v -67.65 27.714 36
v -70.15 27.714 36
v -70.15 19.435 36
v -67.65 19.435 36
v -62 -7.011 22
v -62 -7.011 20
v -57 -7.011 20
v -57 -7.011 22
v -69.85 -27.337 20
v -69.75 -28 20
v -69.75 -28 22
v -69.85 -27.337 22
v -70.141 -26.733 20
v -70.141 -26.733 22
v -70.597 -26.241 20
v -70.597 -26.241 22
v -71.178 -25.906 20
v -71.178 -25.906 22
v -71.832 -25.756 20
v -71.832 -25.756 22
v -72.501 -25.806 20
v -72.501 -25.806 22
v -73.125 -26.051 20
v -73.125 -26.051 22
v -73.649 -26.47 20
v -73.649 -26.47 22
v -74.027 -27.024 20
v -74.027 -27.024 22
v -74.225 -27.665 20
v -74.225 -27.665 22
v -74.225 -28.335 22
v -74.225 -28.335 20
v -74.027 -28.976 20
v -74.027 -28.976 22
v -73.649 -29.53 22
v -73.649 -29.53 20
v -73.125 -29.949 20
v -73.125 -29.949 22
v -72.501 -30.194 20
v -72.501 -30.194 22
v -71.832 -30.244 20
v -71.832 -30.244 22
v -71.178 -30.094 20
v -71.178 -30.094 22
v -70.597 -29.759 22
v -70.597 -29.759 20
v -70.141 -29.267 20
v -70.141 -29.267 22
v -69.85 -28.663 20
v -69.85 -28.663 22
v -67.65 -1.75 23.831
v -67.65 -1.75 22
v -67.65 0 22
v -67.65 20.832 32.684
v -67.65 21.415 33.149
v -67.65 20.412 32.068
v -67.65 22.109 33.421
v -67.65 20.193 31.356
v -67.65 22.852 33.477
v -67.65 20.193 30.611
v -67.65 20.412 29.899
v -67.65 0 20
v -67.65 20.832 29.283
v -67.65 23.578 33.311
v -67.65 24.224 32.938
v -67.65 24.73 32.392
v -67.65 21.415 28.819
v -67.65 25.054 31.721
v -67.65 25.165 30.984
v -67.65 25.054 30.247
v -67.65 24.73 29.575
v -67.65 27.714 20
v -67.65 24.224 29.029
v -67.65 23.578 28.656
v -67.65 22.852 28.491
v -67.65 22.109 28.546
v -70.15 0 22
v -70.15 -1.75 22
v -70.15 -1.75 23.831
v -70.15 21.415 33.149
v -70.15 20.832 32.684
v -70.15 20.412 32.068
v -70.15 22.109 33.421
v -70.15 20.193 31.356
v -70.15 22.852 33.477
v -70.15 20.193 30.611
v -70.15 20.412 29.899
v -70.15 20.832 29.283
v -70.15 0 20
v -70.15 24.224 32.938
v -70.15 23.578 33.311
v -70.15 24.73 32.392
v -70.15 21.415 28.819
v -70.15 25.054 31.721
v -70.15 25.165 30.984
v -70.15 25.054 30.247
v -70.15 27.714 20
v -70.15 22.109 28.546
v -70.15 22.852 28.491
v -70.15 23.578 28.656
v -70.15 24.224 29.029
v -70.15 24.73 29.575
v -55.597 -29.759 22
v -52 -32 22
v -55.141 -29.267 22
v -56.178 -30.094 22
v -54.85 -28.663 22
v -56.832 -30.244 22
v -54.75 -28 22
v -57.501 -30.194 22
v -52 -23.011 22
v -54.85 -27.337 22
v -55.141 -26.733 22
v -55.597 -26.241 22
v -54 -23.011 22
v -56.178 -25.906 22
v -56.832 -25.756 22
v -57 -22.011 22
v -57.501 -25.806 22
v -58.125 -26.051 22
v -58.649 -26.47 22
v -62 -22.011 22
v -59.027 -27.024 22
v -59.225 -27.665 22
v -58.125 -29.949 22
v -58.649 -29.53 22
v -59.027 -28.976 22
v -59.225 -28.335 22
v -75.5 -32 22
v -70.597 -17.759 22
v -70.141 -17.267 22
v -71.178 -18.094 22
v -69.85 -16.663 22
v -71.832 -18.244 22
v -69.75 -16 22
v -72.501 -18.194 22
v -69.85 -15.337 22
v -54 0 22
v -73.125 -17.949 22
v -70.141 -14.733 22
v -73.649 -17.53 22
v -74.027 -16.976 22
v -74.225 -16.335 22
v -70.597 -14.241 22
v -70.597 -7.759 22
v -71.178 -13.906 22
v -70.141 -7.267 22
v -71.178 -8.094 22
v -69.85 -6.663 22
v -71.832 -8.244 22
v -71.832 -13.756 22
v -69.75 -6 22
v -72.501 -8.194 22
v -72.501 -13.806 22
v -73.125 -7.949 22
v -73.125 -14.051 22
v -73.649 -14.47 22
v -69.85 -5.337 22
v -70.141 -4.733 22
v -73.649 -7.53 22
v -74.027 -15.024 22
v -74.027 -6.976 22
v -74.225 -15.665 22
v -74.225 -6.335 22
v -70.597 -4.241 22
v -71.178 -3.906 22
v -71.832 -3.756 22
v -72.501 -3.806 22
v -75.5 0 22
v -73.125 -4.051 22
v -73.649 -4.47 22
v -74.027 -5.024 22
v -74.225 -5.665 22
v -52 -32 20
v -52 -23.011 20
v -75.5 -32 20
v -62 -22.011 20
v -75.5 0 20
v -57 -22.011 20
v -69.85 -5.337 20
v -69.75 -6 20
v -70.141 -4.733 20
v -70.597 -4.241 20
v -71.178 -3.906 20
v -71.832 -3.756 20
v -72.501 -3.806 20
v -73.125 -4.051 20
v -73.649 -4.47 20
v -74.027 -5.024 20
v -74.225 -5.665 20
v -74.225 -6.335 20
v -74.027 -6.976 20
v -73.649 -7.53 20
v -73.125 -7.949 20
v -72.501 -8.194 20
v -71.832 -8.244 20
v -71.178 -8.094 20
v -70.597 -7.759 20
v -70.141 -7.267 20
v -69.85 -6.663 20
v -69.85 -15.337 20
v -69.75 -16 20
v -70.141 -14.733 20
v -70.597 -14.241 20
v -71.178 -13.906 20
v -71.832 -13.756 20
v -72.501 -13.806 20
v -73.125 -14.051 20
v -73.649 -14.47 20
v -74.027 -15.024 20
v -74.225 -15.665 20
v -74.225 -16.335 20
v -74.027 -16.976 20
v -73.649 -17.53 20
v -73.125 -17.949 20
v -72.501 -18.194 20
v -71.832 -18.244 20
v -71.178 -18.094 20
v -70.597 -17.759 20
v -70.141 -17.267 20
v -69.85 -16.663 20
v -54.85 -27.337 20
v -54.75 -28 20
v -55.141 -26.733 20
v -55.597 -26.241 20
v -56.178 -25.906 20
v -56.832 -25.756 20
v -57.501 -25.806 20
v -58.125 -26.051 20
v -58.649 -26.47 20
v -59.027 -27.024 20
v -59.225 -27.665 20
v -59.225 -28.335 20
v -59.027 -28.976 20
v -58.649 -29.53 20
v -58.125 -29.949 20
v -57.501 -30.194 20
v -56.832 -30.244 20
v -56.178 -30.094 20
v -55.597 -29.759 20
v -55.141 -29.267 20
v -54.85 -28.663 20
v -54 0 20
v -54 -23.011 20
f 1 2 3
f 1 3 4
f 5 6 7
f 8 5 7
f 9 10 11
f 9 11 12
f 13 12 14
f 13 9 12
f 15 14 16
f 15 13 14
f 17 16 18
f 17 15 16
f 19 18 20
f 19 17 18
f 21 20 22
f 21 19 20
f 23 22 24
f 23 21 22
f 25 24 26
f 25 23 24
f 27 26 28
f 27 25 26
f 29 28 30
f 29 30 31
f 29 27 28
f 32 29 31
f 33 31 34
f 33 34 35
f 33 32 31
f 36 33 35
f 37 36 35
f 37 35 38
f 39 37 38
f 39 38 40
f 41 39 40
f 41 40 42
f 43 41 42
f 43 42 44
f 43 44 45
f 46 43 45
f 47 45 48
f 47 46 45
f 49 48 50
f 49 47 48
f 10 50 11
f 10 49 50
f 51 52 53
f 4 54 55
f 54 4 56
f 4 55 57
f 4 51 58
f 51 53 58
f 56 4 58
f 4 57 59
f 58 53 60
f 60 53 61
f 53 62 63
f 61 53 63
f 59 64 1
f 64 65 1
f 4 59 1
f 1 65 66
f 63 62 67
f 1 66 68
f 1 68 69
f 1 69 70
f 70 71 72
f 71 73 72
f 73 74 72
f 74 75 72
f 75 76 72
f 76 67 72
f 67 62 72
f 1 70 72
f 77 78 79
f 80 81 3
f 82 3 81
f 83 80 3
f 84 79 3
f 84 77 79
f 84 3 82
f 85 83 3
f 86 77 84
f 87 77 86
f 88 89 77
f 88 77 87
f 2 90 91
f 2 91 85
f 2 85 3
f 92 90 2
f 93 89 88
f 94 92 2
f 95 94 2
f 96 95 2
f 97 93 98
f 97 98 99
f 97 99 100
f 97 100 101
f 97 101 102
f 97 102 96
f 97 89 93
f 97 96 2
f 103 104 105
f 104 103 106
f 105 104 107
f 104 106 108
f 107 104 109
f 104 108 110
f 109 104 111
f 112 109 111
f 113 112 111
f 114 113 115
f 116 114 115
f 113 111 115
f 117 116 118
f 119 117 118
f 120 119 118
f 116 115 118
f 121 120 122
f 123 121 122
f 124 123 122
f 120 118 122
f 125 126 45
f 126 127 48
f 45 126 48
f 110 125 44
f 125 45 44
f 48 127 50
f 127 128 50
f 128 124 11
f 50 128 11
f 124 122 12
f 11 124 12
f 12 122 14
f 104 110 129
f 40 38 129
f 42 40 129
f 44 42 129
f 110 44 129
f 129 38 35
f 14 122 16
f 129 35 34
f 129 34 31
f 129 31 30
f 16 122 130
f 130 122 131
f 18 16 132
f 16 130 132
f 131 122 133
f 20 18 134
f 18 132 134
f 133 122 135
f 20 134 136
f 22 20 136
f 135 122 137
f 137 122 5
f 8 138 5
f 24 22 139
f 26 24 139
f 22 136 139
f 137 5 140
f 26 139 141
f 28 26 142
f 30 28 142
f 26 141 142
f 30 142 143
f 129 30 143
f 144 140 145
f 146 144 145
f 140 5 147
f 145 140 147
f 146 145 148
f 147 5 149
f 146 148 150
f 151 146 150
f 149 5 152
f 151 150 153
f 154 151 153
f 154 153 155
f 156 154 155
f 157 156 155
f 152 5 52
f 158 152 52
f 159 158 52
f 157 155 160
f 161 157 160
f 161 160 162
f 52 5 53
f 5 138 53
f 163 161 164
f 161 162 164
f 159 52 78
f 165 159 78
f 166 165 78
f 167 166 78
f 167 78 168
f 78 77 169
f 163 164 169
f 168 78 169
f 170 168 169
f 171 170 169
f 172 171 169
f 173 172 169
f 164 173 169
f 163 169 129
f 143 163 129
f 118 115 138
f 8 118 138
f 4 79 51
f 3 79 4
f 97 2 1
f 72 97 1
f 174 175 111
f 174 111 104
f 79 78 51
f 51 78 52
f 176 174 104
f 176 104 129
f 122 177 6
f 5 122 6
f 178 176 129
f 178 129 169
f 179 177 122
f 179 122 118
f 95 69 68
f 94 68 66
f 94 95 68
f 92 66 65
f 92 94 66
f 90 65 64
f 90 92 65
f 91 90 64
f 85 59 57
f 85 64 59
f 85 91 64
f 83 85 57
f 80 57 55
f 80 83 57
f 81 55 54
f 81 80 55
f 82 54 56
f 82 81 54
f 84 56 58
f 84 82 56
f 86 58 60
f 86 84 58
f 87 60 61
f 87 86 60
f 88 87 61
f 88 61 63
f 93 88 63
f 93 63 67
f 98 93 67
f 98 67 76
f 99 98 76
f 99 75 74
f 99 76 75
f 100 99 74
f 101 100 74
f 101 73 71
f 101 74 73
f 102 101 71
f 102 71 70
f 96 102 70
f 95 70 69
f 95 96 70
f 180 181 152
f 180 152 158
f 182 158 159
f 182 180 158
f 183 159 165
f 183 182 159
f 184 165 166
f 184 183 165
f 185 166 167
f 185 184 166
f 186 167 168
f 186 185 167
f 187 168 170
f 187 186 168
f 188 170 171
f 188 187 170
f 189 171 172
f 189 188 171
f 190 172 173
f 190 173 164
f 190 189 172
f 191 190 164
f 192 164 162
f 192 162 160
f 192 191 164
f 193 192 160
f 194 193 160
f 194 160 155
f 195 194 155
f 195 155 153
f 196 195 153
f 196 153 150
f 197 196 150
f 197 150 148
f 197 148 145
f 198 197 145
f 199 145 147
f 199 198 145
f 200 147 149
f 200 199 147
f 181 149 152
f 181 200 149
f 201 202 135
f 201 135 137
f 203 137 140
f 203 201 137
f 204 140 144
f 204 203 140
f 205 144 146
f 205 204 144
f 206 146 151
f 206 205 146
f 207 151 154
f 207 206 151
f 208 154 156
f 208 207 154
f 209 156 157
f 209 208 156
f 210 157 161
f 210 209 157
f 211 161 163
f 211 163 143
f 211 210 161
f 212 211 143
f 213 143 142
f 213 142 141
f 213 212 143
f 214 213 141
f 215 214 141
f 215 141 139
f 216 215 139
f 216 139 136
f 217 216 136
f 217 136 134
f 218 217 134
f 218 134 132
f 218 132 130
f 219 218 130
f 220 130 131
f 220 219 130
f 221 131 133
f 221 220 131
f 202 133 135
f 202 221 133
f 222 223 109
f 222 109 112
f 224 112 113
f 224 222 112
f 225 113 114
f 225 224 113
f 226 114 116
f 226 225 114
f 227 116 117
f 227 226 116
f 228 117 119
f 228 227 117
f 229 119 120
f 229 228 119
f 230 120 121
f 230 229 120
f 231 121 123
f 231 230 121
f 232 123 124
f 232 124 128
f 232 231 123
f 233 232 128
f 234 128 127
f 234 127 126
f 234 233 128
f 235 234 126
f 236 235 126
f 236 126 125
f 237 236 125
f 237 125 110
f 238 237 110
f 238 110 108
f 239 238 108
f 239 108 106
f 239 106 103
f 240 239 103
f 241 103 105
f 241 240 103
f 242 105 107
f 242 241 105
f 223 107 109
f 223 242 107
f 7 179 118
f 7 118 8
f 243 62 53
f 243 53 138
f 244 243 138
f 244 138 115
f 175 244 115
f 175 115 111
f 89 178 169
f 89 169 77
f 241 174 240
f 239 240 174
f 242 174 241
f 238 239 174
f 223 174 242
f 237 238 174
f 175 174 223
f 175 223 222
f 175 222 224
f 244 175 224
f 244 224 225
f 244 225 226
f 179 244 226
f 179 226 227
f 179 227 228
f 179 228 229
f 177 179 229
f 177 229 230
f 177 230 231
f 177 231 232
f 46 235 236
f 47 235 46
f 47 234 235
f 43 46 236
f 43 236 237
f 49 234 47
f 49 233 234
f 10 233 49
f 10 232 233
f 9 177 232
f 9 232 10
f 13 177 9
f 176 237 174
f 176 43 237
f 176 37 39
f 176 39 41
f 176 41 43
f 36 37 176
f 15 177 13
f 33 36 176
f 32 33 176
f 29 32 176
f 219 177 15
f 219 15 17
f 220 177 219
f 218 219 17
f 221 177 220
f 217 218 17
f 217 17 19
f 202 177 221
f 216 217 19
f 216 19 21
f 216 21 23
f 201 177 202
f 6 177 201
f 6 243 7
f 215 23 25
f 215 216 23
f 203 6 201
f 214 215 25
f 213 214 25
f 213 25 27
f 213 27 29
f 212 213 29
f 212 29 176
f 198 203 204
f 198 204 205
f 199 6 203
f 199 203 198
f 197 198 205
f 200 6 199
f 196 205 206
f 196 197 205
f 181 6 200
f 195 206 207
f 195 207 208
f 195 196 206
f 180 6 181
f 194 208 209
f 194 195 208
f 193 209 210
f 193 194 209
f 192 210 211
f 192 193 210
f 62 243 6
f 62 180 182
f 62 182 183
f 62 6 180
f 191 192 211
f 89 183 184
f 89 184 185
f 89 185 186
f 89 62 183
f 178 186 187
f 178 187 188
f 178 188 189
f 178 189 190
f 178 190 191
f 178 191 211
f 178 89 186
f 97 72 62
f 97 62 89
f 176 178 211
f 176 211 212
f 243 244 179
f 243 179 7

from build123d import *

# Parameters (mm, degrees)
SKETCH028_R        = 2.25
SKETCH028_W        = 5
SKETCH028_H        = 15
PAD012_DEPTH       = 2
SKETCH029_W        = 2.5
SKETCH029_H        = 29.464039
PAD013_DEPTH       = 16
SKETCH030_R        = 2.5
POCKET007005_DEPTH = 18.151
POCKET007010_DEPTH = 5


with BuildPart() as part:
    # Sketch028 → Pad012 (new body)
    with BuildSketch(Plane.XY):
        Polygon((-52, -32), (-75.5, -32), (-75.5, 0), (-54, 0), (-54, -23.010657), (-52, -23.010657), align=None)
        with Locations((-72, -28)):
            Circle(SKETCH028_R, mode=Mode.SUBTRACT)
        with Locations((-72, -16)):
            Circle(SKETCH028_R, mode=Mode.SUBTRACT)
        with Locations((-72, -6)):
            Circle(SKETCH028_R, mode=Mode.SUBTRACT)
        with Locations((-57, -28)):
            Circle(SKETCH028_R, mode=Mode.SUBTRACT)
        with Locations((-59.5, -14.510657)):
            Rectangle(SKETCH028_W, SKETCH028_H, mode=Mode.SUBTRACT)
    extrude(amount=PAD012_DEPTH)

    # Sketch029 → Pad013 (join)
    with BuildSketch(Plane.XY):
        with Locations((-68.9, 12.982019)):
            Rectangle(SKETCH029_W, SKETCH029_H)
    extrude(amount=PAD013_DEPTH)

    # Sketch030 (on DatumPlane) → Pocket007005 (cut, through all)
    with BuildSketch(Plane(origin=(-70.15, -1.75, 0), x_dir=(0, 1, 0), z_dir=(1, 0, 0))):
        with Locations((24.414811, 10.983683)):
            Circle(SKETCH030_R)
    extrude(amount=POCKET007005_DEPTH, mode=Mode.SUBTRACT)

    # Sketch041 (on DatumPlane) → Pocket007010 (cut)
    with BuildSketch(Plane(origin=(-70.15, -1.75, 0), x_dir=(0, 1, 0), z_dir=(1, 0, 0))):
        Polygon((-2.326099, 2.494806), (28.94412, 20.456944), (-2.326099, 20.456944), align=None)
    extrude(amount=POCKET007010_DEPTH, mode=Mode.SUBTRACT)


with BuildPart() as part_1:
    # Body001 placement: moved
    add(part.part.moved(Location((0, 0, 20))))


solid = part_1.part
